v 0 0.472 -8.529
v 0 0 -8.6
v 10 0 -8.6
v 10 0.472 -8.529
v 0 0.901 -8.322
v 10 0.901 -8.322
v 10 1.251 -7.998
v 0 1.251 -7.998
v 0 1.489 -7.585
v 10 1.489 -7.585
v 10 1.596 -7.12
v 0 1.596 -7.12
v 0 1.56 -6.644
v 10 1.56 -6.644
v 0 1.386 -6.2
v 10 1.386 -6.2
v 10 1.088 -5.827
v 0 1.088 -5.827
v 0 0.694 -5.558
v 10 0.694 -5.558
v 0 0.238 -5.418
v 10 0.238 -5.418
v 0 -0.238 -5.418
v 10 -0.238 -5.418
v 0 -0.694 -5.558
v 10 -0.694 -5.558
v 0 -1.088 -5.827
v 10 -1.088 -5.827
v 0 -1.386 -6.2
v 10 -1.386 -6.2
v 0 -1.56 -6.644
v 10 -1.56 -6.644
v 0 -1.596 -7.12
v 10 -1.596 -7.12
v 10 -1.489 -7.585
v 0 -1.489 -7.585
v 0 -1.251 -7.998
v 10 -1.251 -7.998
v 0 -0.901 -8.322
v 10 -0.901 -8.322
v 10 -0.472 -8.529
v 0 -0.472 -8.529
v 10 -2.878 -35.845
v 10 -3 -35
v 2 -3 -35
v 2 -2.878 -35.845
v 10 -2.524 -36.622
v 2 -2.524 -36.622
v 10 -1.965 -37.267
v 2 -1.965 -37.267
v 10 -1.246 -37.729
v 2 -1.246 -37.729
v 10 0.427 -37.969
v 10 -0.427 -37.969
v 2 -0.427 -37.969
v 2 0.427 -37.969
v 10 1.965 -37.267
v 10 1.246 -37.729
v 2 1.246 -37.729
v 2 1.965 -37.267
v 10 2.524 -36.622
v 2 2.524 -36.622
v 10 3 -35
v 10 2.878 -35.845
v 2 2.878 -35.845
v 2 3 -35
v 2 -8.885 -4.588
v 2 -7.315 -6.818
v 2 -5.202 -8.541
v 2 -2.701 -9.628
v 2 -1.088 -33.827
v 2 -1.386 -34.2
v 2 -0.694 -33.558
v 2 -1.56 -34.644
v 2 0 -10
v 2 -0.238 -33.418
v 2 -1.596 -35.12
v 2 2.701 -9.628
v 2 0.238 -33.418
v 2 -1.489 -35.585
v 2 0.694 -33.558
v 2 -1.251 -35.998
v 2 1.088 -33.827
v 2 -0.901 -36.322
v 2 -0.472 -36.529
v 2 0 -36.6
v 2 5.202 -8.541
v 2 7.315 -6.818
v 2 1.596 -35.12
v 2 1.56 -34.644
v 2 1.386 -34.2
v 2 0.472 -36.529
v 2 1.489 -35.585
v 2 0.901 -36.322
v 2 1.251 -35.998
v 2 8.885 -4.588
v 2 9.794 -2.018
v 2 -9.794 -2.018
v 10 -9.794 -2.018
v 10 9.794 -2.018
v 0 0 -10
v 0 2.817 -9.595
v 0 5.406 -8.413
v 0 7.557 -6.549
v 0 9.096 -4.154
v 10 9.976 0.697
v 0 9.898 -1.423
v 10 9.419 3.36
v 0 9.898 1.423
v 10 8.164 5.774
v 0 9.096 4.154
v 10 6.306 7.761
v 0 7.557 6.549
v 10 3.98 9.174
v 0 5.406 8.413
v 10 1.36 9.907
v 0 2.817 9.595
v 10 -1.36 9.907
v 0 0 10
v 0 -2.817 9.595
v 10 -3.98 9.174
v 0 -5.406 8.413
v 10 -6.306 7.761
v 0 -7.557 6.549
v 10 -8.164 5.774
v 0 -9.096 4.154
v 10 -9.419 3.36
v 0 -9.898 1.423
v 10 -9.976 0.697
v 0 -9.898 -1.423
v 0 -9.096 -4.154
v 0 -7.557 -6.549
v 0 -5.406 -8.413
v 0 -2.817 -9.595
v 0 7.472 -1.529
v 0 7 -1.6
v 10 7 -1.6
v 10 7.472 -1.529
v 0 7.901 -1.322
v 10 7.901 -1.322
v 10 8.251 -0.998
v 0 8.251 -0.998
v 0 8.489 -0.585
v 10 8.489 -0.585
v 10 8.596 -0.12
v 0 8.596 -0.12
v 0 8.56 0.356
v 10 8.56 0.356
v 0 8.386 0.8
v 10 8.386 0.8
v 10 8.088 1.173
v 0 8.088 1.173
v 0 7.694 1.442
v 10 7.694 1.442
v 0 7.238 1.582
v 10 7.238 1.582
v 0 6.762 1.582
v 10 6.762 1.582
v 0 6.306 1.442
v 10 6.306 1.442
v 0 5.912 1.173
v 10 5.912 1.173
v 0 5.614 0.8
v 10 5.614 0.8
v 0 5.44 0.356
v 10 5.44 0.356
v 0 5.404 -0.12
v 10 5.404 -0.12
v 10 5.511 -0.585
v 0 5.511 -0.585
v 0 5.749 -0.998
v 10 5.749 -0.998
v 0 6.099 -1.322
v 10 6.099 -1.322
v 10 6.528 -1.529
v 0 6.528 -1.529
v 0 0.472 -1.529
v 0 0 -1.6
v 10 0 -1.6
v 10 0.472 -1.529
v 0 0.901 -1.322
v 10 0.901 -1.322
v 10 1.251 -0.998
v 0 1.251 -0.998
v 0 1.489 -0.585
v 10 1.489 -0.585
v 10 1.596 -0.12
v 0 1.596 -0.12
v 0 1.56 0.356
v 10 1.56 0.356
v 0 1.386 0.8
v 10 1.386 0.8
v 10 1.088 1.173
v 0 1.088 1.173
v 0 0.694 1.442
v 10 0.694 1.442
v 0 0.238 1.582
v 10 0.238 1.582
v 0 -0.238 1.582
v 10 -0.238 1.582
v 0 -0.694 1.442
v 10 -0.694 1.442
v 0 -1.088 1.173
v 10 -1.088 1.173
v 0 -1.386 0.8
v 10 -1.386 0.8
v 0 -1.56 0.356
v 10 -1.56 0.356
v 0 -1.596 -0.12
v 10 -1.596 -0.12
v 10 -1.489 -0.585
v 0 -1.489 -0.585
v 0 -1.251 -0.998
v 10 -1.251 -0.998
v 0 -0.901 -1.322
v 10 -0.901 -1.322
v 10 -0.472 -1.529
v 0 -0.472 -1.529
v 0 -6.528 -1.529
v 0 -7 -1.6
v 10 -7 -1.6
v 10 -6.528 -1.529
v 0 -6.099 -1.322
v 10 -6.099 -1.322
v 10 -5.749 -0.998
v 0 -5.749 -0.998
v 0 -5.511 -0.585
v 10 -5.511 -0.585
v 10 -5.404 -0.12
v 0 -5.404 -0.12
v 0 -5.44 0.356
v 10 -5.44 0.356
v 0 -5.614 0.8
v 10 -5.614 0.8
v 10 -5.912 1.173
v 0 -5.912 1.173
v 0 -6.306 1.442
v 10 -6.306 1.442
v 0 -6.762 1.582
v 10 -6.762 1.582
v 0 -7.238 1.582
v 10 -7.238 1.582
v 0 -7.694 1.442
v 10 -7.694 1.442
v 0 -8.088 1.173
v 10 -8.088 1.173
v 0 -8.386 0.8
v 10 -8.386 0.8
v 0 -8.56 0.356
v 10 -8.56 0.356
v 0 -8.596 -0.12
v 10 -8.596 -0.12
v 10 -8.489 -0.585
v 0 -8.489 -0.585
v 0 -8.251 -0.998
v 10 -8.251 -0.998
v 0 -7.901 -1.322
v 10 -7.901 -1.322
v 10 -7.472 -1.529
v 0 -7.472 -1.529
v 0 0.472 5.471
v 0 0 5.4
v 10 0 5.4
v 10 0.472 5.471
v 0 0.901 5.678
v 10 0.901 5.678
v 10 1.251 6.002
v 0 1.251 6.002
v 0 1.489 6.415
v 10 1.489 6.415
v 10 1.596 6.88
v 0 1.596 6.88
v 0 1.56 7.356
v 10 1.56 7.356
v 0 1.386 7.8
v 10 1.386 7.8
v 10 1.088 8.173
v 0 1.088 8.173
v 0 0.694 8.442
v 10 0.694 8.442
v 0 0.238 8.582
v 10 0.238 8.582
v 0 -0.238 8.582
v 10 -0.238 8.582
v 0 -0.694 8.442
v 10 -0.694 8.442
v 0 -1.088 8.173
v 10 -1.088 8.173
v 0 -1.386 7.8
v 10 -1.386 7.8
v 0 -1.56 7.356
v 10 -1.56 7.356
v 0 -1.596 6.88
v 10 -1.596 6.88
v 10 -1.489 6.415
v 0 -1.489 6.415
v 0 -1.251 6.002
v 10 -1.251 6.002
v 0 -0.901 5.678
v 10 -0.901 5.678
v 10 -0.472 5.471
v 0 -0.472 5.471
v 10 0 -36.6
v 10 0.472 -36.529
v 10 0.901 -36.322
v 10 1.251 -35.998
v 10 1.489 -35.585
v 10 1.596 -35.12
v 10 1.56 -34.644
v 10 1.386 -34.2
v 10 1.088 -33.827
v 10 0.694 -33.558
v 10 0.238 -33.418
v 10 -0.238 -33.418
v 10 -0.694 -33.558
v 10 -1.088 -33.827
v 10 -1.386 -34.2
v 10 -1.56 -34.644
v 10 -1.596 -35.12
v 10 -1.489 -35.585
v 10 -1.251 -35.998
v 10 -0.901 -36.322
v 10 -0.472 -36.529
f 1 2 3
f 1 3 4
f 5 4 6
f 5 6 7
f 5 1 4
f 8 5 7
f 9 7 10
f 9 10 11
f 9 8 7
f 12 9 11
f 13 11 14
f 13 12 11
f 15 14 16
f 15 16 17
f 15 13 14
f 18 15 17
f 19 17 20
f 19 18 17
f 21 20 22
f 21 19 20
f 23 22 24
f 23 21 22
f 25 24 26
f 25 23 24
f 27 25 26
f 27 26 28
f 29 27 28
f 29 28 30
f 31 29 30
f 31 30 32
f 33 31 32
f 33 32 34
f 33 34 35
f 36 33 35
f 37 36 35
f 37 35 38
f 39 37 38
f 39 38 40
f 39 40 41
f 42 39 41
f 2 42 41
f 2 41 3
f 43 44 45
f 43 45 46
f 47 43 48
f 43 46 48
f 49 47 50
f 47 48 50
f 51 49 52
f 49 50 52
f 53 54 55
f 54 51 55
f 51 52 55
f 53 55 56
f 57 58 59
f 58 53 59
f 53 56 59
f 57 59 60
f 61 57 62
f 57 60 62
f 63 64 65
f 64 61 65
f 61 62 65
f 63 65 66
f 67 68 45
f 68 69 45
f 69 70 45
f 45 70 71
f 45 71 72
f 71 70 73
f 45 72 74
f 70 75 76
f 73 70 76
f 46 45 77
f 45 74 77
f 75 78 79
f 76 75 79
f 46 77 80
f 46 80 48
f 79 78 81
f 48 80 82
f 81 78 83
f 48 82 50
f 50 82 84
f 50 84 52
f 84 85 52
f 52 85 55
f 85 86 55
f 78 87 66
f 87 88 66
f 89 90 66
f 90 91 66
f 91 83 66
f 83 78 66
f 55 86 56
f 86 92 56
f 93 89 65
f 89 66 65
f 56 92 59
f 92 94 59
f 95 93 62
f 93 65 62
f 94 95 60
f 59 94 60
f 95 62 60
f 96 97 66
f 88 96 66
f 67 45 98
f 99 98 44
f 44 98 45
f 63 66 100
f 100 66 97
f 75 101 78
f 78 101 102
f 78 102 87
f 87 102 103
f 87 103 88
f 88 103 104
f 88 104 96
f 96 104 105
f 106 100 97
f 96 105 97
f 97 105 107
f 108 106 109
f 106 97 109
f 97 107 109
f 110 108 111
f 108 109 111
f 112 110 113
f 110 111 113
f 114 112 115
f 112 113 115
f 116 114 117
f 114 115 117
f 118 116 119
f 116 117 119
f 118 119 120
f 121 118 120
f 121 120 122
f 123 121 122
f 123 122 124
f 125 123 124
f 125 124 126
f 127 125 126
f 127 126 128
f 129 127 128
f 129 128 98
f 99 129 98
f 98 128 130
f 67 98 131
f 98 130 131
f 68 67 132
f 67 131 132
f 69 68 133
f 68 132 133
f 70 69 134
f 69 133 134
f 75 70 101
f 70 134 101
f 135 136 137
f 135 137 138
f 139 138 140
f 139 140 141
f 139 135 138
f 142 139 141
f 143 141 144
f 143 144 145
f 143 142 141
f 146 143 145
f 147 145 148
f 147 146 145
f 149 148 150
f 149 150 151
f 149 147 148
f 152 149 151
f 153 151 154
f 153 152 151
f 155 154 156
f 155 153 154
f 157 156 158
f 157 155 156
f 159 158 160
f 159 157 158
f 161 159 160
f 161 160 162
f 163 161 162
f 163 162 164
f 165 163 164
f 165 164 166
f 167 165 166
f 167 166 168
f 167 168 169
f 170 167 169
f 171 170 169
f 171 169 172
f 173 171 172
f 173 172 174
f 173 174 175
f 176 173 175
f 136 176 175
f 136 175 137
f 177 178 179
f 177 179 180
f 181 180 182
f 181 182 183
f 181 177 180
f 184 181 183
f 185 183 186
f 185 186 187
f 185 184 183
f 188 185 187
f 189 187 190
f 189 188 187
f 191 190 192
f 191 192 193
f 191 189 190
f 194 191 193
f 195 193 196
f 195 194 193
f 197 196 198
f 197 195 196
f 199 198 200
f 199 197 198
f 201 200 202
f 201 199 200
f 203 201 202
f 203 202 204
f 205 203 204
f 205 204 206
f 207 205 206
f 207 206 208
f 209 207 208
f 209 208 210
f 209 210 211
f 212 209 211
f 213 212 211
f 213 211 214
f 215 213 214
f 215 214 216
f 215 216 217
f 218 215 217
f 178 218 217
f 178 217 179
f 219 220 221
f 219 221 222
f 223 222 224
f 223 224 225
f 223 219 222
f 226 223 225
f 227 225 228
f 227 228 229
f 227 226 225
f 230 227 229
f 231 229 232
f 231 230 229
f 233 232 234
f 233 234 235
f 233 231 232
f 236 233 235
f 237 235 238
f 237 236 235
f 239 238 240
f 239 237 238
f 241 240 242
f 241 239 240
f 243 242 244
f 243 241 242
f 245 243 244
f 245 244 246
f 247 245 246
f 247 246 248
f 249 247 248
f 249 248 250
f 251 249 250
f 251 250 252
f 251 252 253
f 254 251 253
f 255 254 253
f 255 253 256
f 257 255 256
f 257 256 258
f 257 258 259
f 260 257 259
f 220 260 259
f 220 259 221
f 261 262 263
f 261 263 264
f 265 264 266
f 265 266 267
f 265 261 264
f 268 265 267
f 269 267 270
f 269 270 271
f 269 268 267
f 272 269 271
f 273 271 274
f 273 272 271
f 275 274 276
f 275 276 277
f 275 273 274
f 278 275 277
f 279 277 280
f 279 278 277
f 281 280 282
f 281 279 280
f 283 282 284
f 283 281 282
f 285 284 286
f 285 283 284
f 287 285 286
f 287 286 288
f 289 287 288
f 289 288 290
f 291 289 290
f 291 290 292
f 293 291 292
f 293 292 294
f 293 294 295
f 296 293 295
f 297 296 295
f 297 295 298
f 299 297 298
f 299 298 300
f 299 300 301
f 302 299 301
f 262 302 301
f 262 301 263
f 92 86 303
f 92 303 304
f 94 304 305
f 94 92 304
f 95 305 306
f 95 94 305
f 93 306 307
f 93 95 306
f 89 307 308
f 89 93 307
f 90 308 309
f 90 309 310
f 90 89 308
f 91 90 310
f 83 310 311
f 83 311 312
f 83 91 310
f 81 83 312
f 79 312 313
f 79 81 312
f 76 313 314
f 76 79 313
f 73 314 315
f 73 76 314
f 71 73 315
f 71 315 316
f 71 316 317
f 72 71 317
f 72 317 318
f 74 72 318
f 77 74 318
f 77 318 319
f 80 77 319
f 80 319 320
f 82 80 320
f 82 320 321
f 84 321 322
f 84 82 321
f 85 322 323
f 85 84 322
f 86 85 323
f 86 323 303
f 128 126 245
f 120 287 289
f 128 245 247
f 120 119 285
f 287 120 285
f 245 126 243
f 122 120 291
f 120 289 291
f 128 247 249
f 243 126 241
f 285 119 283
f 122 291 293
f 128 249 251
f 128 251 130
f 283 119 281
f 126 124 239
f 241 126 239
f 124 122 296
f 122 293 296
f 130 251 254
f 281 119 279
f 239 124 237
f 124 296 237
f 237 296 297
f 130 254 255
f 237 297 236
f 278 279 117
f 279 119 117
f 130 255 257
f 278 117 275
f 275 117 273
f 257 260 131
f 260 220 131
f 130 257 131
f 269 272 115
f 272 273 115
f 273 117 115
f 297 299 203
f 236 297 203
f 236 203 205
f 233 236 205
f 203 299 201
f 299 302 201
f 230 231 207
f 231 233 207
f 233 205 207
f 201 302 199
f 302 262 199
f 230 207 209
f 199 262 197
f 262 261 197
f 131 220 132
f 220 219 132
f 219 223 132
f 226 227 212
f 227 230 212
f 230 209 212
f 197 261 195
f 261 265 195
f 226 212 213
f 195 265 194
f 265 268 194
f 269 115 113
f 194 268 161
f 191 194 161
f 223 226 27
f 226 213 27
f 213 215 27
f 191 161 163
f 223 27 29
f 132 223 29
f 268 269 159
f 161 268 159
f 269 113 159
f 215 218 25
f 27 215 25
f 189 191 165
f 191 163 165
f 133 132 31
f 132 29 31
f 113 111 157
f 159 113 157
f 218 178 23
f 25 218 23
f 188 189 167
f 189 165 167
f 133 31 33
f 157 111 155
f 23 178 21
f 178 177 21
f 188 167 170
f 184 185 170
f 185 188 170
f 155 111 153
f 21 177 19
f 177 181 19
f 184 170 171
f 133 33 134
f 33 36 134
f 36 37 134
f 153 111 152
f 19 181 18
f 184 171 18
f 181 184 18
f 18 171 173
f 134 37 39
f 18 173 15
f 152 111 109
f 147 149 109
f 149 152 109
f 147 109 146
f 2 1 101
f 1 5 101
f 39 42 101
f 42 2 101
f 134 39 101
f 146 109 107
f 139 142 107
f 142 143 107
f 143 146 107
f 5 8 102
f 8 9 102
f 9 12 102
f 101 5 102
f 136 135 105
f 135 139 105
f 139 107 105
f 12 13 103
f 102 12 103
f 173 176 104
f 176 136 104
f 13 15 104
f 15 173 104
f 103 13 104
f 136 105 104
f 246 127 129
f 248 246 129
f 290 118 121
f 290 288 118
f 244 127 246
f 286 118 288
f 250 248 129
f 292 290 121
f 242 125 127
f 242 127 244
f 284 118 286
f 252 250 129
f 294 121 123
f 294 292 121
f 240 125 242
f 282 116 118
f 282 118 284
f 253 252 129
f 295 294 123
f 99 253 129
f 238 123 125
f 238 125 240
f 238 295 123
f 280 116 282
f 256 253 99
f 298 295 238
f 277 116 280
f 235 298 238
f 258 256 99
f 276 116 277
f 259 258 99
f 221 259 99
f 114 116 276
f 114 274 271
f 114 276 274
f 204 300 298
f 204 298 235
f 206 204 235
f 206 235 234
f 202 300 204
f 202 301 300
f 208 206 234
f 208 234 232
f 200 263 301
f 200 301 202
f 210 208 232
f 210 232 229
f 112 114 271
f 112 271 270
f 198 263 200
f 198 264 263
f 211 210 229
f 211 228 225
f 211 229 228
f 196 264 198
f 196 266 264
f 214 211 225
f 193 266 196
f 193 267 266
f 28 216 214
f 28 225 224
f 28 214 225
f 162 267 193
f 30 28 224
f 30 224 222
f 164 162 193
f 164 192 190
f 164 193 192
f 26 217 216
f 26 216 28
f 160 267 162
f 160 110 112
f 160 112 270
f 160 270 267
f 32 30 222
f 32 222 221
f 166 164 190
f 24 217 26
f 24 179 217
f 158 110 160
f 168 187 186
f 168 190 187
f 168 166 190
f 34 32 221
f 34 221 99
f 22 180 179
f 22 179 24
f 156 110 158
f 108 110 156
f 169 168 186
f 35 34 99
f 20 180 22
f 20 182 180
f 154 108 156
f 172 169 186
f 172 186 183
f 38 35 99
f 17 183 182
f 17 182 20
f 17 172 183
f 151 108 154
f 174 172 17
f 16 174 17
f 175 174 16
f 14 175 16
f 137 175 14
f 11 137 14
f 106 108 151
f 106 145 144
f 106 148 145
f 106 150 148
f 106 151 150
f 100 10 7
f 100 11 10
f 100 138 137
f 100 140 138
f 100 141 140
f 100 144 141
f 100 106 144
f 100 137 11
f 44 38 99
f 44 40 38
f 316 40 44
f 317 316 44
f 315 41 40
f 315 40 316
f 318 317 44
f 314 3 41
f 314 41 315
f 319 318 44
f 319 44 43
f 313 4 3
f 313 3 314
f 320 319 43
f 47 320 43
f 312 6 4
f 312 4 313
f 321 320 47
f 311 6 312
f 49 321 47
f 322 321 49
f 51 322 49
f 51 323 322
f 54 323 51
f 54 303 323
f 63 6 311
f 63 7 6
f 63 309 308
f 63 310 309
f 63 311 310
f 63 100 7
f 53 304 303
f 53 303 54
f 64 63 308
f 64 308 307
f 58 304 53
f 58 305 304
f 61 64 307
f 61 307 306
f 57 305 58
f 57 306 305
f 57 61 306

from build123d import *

# Parameters (mm, degrees)
ESQUISSE1_R             = 10
ESQUISSE1_R_2           = 1.6
BOSS_EXTRU_1_DEPTH      = 2
BOSS_EXTRU_2_DEPTH      = 8
BOSS_EXTRU_2_DEPTH_BACK = 0.0001
ESQUISSE2_R             = 10
ESQUISSE2_R_2           = 1.6
ESQUISSE2_R_3           = 3


with BuildPart() as part:
    # Esquisse1 → Boss.-Extru.1 (new body)
    with BuildSketch(Plane(origin=(0, 0, 0), x_dir=(0, 0, -1), z_dir=(1, 0, 0))):
        Circle(ESQUISSE1_R)
        with Locations((0, 7)):
            Circle(ESQUISSE1_R_2, mode=Mode.SUBTRACT)
        with Locations((7, 0)):
            Circle(ESQUISSE1_R_2, mode=Mode.SUBTRACT)
        with Locations((0, -7)):
            Circle(ESQUISSE1_R_2, mode=Mode.SUBTRACT)
        with Locations((-7, 0)):
            Circle(ESQUISSE1_R_2, mode=Mode.SUBTRACT)
        Circle(ESQUISSE1_R_2, mode=Mode.SUBTRACT)
    extrude(amount=BOSS_EXTRU_1_DEPTH)

    # Esquisse2 → Boss.-Extru.2 (add, two sides: drawn at the far end of the back side and taken through both)
    # profile 1 of 3: a face of its own
    with BuildSketch(Plane(origin=(2, 0, 0), x_dir=(0, 0, -1), z_dir=(1, 0, 0)).offset(-BOSS_EXTRU_2_DEPTH_BACK)):
        Circle(ESQUISSE2_R)
        Circle(ESQUISSE2_R_2, mode=Mode.SUBTRACT)
        with Locations((0, 7)):
            Circle(ESQUISSE2_R_2, mode=Mode.SUBTRACT)
        with Locations((-7, 0)):
            Circle(ESQUISSE2_R_2, mode=Mode.SUBTRACT)
        with Locations((7, 0)):
            Circle(ESQUISSE2_R_2, mode=Mode.SUBTRACT)
        with Locations((0, -7)):
            Circle(ESQUISSE2_R_2, mode=Mode.SUBTRACT)
    # profile 2 of 3: a face of its own
    with BuildSketch(Plane(origin=(2, 0, 0), x_dir=(0, 0, -1), z_dir=(1, 0, 0)).offset(-BOSS_EXTRU_2_DEPTH_BACK)):
        with BuildLine():
            Line((35, 3), (2.017627638, 9.794344221))
            ThreePointArc((2.017627638, 9.794344221), (7.7516539, 6.317583542), (10, 0))
            ThreePointArc((10, 0), (7.7516539, -6.317583542), (2.017627638, -9.794344221))
            Line((2.017627638, -9.794344221), (35, -3))
            ThreePointArc((35, -3), (32, 0), (35, 3))
        make_face()
    # profile 3 of 3: a face of its own
    with BuildSketch(Plane(origin=(2, 0, 0), x_dir=(0, 0, -1), z_dir=(1, 0, 0)).offset(-BOSS_EXTRU_2_DEPTH_BACK)):
        with Locations((35, 0)):
            Circle(ESQUISSE2_R_3)
        with Locations((35, 0)):
            Circle(ESQUISSE2_R_2, mode=Mode.SUBTRACT)
    extrude(amount=BOSS_EXTRU_2_DEPTH + BOSS_EXTRU_2_DEPTH_BACK)


solid = part.part
